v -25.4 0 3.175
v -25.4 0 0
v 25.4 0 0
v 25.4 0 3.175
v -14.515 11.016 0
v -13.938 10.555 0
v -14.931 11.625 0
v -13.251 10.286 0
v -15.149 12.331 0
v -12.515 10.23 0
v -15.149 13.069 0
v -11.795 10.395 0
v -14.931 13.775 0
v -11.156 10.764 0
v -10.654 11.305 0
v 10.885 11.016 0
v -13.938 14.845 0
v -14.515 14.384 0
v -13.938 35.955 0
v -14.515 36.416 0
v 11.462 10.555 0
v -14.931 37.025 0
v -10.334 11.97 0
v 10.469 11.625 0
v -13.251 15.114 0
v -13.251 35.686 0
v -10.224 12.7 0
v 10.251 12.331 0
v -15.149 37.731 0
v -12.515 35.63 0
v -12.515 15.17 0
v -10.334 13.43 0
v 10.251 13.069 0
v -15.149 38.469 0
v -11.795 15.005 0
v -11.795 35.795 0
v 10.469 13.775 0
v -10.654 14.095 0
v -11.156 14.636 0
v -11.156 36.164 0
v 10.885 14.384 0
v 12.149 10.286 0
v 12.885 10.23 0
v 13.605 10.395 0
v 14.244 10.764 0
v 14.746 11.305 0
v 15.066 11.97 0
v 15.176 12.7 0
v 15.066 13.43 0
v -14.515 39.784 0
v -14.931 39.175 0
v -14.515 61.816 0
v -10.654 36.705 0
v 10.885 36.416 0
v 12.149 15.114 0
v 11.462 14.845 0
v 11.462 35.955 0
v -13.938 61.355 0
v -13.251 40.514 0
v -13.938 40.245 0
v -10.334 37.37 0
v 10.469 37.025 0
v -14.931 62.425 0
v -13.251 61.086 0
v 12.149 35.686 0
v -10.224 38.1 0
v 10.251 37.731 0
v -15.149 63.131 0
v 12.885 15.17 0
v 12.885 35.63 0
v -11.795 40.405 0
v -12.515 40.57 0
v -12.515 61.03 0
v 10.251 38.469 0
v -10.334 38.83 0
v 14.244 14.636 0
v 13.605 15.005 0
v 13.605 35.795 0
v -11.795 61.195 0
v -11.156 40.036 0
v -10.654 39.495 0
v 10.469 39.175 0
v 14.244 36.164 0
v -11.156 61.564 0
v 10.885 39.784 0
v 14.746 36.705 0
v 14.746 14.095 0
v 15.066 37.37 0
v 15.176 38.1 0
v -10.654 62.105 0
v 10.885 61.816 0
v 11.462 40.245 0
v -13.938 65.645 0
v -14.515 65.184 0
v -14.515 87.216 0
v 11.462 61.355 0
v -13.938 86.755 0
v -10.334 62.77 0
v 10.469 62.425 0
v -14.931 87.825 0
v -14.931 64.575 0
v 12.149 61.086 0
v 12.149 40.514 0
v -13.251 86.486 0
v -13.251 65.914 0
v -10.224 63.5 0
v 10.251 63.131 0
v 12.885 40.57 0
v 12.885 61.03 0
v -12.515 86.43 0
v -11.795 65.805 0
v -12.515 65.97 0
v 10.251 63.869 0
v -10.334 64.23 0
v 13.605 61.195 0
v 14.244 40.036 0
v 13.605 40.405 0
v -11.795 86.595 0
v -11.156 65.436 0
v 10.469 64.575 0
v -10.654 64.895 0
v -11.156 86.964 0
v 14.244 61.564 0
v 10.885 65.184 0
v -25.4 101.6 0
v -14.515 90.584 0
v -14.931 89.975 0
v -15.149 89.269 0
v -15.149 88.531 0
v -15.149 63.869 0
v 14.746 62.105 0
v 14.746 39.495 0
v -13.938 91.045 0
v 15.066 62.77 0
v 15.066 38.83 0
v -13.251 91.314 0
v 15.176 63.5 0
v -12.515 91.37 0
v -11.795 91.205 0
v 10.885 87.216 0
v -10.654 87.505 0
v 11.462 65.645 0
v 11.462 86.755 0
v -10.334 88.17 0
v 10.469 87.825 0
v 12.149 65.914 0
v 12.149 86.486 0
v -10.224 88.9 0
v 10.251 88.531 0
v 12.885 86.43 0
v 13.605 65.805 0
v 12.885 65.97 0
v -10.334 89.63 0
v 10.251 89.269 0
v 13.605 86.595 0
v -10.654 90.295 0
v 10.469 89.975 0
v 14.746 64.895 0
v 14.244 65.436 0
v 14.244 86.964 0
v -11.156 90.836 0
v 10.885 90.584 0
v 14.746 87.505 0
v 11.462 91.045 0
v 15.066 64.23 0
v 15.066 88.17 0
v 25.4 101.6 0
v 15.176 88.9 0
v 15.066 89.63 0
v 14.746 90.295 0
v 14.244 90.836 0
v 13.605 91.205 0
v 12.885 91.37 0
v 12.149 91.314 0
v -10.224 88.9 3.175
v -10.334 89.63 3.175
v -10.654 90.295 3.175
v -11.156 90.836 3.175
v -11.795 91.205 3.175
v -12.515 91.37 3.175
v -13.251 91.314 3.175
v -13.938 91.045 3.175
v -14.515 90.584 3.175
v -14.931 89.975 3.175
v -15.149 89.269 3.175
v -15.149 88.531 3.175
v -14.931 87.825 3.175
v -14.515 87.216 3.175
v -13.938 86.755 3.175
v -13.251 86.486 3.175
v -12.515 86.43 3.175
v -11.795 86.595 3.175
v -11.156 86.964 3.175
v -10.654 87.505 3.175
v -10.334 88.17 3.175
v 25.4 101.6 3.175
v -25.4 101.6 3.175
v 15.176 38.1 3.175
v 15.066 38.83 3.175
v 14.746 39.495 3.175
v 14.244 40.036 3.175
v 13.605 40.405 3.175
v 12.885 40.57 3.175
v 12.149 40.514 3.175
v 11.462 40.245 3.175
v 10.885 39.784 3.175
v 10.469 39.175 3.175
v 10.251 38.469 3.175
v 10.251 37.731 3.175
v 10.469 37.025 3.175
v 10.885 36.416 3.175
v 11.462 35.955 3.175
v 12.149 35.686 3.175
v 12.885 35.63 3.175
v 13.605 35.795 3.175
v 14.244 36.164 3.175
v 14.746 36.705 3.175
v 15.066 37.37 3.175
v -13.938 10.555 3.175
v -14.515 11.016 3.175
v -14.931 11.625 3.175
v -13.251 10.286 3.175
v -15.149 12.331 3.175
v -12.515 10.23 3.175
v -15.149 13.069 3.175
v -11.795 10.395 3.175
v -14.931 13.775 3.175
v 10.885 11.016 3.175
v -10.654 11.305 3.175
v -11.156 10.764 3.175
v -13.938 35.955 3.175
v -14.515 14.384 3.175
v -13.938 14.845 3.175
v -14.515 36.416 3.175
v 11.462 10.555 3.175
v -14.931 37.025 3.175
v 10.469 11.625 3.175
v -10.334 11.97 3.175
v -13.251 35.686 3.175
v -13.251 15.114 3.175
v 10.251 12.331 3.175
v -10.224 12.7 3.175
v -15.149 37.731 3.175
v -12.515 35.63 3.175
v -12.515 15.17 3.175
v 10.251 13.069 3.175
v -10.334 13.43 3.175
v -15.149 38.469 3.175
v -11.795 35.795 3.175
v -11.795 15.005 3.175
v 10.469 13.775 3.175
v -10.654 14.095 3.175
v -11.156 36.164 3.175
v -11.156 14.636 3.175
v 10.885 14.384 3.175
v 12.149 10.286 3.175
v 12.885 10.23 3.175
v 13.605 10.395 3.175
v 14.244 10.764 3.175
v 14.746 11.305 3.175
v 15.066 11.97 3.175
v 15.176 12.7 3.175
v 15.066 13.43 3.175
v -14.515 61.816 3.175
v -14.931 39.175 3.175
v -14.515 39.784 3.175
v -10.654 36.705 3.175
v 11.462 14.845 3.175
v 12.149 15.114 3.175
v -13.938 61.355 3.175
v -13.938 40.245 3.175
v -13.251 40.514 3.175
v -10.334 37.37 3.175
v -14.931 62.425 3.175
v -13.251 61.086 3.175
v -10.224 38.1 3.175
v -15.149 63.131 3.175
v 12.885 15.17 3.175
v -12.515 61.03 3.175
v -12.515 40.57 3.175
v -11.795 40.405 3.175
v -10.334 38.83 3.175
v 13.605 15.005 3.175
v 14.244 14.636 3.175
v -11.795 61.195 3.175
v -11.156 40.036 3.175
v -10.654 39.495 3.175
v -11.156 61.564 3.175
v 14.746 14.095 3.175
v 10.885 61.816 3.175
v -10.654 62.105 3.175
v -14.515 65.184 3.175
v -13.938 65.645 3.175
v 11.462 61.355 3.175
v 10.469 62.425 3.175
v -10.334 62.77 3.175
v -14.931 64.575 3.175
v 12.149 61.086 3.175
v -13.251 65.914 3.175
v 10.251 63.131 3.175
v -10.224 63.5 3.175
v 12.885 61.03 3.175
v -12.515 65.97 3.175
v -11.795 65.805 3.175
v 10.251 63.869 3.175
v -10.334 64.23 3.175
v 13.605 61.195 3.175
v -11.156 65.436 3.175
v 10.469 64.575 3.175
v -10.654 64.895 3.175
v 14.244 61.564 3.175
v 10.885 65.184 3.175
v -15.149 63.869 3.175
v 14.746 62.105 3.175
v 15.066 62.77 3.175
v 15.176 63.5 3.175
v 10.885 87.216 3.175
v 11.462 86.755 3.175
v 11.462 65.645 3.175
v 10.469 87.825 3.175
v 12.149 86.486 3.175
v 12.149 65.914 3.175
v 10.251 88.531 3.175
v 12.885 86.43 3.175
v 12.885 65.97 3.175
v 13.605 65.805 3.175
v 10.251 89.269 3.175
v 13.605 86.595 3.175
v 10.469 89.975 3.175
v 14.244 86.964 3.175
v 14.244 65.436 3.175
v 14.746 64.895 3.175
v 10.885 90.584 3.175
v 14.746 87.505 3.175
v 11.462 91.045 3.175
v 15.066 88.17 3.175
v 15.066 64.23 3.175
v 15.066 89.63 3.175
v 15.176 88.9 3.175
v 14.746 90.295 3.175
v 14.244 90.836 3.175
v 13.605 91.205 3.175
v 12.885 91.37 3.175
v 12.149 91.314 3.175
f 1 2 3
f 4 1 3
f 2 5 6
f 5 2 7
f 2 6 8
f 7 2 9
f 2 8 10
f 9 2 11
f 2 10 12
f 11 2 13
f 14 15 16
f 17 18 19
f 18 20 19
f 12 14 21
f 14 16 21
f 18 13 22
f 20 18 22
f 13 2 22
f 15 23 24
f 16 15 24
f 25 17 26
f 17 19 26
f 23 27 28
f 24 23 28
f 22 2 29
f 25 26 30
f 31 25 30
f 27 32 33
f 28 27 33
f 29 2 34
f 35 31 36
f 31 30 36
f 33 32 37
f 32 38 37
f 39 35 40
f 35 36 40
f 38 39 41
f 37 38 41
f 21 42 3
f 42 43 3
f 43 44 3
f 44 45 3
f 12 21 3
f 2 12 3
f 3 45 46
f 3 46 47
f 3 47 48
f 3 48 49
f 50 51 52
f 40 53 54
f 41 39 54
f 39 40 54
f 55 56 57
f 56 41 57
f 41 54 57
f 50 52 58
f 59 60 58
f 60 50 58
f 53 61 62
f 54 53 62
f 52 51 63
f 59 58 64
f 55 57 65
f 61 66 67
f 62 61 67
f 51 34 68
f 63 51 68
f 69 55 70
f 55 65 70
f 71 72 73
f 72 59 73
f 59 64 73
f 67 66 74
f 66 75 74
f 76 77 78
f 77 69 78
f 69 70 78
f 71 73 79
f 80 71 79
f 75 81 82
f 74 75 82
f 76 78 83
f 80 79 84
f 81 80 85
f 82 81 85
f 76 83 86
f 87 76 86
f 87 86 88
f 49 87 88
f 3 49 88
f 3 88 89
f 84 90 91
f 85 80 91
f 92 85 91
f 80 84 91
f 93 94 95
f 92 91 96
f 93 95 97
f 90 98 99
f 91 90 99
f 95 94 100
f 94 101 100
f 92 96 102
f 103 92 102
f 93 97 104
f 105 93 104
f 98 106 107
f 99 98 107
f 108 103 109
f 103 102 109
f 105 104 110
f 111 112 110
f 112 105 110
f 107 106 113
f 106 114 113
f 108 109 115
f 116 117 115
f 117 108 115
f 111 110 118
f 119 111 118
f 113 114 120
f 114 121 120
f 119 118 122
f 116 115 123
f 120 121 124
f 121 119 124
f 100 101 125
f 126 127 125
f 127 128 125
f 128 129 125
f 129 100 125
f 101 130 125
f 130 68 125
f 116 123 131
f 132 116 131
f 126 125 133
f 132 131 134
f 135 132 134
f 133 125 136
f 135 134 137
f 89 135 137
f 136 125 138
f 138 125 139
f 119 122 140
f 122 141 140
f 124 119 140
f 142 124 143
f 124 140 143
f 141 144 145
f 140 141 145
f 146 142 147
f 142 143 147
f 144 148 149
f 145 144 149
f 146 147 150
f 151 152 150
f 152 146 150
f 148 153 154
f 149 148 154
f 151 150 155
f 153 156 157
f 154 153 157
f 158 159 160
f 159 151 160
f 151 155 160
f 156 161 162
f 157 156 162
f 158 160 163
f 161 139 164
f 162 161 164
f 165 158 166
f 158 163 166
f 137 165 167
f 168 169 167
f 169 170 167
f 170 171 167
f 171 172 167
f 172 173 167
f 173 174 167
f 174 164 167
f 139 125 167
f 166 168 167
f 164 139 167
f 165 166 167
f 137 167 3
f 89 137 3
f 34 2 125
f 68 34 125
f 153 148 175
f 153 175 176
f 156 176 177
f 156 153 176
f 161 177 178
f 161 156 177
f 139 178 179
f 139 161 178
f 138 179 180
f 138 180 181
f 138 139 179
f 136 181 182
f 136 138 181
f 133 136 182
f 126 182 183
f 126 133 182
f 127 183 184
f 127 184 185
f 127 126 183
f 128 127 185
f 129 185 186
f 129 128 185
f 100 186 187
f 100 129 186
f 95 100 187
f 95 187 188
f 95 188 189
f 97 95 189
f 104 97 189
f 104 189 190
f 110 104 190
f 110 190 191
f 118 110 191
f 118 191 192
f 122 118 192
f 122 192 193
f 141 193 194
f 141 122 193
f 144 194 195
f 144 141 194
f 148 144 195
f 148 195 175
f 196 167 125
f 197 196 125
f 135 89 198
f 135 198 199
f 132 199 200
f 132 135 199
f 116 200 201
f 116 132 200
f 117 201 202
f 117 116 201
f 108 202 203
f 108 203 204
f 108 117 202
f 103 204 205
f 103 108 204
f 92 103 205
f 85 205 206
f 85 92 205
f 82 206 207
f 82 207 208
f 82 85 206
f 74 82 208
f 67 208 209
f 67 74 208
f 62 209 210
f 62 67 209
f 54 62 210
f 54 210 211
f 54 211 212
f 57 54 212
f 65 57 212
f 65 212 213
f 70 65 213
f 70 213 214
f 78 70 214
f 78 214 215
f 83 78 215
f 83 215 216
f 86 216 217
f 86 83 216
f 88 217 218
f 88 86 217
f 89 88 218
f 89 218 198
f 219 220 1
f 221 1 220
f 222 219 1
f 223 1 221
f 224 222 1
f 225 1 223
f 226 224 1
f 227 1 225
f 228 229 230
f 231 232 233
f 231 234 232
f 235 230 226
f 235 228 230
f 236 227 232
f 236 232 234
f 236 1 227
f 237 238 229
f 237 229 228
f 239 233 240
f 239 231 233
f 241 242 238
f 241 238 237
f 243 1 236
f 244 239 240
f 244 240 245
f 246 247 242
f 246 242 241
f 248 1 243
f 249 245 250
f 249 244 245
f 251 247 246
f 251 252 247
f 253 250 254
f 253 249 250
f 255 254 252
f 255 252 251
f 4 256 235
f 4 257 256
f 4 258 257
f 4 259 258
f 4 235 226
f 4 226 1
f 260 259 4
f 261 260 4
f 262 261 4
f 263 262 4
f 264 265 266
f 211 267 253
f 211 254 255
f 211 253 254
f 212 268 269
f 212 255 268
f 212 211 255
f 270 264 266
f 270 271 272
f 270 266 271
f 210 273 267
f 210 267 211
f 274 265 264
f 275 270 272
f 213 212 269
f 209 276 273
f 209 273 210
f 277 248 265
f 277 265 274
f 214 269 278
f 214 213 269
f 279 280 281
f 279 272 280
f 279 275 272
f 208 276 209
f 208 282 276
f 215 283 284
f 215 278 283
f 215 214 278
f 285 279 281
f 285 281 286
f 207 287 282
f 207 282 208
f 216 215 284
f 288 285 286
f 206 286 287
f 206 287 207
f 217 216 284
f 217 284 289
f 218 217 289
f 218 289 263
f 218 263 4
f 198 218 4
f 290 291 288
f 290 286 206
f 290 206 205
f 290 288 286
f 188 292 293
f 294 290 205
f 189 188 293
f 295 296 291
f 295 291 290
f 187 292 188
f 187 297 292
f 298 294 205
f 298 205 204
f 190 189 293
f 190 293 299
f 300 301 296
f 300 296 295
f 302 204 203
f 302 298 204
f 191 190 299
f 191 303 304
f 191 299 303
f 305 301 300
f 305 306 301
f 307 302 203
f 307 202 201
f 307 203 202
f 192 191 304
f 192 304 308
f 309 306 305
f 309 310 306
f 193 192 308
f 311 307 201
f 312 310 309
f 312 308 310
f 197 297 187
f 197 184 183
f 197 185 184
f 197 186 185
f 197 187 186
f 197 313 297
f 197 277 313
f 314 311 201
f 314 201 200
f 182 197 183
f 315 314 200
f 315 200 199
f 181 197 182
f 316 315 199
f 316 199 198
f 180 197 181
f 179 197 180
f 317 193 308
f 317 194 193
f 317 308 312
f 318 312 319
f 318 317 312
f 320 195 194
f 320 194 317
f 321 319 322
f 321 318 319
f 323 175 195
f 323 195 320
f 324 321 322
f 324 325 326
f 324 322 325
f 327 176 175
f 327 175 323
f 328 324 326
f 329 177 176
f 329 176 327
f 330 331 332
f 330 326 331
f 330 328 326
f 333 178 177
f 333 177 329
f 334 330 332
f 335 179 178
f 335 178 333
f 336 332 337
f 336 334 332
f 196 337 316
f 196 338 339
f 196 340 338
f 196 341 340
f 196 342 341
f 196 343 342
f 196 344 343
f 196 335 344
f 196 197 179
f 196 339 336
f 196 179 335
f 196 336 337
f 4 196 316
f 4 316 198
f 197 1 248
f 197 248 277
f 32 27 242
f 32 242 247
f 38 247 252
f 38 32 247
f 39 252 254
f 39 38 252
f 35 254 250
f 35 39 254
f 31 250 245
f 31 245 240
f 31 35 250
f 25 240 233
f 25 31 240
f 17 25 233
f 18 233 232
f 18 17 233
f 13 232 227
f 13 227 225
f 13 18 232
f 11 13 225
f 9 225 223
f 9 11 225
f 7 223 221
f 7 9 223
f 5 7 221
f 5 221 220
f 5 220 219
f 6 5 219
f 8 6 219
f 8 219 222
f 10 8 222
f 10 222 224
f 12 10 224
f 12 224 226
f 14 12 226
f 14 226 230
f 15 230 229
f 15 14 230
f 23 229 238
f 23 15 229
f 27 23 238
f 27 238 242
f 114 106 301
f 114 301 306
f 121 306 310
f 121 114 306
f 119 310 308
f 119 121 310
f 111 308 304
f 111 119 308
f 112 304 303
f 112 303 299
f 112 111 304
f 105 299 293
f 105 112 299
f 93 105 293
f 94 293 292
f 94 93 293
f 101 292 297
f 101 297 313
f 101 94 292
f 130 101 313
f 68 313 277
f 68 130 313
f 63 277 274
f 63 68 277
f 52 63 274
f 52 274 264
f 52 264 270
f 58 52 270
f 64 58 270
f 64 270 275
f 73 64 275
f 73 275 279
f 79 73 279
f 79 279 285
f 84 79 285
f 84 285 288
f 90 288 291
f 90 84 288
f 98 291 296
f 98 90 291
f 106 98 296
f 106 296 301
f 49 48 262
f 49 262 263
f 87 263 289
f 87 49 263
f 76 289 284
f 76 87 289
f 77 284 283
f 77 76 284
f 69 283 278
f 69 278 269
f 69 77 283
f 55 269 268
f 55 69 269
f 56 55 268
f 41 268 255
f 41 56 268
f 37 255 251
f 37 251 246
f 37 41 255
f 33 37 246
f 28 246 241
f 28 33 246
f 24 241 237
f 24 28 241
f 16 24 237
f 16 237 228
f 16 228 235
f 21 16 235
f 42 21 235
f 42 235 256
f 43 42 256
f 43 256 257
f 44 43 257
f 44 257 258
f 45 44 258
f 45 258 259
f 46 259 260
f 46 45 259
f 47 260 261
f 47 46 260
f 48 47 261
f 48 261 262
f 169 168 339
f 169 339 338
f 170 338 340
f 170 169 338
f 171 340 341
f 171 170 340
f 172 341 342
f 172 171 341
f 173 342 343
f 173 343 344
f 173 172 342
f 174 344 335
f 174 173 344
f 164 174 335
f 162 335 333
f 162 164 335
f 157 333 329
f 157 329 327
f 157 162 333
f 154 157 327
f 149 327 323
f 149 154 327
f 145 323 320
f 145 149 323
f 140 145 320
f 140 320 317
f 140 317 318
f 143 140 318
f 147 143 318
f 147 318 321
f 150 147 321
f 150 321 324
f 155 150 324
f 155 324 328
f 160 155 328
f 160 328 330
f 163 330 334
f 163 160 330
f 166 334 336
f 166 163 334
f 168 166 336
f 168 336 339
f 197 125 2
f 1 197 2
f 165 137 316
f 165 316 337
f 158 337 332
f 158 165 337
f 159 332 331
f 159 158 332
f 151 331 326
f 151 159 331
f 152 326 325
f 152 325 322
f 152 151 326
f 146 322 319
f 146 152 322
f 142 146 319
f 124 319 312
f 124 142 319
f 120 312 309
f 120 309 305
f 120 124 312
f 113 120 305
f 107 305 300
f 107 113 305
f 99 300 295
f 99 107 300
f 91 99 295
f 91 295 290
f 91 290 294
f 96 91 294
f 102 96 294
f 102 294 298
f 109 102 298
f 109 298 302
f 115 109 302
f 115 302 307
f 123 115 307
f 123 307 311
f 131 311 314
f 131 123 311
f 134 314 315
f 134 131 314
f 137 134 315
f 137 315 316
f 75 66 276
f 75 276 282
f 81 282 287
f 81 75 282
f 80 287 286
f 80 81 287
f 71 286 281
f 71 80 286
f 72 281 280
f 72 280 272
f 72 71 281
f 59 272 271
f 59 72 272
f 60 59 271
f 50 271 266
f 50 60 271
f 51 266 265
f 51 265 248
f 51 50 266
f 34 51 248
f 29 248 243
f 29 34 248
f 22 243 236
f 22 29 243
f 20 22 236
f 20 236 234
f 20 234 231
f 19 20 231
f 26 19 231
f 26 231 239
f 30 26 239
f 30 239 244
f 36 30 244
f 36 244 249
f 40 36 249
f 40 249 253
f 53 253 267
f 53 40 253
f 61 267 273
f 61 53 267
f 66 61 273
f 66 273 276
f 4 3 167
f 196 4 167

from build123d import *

# Parameters (mm, degrees)
SKETCH1_R           = 2.4765
BOSS_EXTRUDE1_DEPTH = 3.175


with BuildPart() as part:
    # Sketch1 → Boss-Extrude1 (new body)
    with BuildSketch(Plane.XY):
        Polygon((0, 0), (25.4, 0), (25.4, 50.8), (25.4, 101.6), (-25.4, 101.6), (-25.4, 50.8), (-25.4, 0), align=None)
        with Locations((12.7, 88.9)):
            Circle(SKETCH1_R, mode=Mode.SUBTRACT)
        with Locations((-12.7, 88.9)):
            Circle(SKETCH1_R, mode=Mode.SUBTRACT)
        with Locations((-12.7, 63.5)):
            Circle(SKETCH1_R, mode=Mode.SUBTRACT)
        with Locations((12.7, 63.5)):
            Circle(SKETCH1_R, mode=Mode.SUBTRACT)
        with Locations((12.7, 12.7)):
            Circle(SKETCH1_R, mode=Mode.SUBTRACT)
        with Locations((-12.7, 12.7)):
            Circle(SKETCH1_R, mode=Mode.SUBTRACT)
        with Locations((-12.7, 38.1)):
            Circle(SKETCH1_R, mode=Mode.SUBTRACT)
        with Locations((12.7, 38.1)):
            Circle(SKETCH1_R, mode=Mode.SUBTRACT)
    extrude(amount=BOSS_EXTRUDE1_DEPTH)


solid = part.part
